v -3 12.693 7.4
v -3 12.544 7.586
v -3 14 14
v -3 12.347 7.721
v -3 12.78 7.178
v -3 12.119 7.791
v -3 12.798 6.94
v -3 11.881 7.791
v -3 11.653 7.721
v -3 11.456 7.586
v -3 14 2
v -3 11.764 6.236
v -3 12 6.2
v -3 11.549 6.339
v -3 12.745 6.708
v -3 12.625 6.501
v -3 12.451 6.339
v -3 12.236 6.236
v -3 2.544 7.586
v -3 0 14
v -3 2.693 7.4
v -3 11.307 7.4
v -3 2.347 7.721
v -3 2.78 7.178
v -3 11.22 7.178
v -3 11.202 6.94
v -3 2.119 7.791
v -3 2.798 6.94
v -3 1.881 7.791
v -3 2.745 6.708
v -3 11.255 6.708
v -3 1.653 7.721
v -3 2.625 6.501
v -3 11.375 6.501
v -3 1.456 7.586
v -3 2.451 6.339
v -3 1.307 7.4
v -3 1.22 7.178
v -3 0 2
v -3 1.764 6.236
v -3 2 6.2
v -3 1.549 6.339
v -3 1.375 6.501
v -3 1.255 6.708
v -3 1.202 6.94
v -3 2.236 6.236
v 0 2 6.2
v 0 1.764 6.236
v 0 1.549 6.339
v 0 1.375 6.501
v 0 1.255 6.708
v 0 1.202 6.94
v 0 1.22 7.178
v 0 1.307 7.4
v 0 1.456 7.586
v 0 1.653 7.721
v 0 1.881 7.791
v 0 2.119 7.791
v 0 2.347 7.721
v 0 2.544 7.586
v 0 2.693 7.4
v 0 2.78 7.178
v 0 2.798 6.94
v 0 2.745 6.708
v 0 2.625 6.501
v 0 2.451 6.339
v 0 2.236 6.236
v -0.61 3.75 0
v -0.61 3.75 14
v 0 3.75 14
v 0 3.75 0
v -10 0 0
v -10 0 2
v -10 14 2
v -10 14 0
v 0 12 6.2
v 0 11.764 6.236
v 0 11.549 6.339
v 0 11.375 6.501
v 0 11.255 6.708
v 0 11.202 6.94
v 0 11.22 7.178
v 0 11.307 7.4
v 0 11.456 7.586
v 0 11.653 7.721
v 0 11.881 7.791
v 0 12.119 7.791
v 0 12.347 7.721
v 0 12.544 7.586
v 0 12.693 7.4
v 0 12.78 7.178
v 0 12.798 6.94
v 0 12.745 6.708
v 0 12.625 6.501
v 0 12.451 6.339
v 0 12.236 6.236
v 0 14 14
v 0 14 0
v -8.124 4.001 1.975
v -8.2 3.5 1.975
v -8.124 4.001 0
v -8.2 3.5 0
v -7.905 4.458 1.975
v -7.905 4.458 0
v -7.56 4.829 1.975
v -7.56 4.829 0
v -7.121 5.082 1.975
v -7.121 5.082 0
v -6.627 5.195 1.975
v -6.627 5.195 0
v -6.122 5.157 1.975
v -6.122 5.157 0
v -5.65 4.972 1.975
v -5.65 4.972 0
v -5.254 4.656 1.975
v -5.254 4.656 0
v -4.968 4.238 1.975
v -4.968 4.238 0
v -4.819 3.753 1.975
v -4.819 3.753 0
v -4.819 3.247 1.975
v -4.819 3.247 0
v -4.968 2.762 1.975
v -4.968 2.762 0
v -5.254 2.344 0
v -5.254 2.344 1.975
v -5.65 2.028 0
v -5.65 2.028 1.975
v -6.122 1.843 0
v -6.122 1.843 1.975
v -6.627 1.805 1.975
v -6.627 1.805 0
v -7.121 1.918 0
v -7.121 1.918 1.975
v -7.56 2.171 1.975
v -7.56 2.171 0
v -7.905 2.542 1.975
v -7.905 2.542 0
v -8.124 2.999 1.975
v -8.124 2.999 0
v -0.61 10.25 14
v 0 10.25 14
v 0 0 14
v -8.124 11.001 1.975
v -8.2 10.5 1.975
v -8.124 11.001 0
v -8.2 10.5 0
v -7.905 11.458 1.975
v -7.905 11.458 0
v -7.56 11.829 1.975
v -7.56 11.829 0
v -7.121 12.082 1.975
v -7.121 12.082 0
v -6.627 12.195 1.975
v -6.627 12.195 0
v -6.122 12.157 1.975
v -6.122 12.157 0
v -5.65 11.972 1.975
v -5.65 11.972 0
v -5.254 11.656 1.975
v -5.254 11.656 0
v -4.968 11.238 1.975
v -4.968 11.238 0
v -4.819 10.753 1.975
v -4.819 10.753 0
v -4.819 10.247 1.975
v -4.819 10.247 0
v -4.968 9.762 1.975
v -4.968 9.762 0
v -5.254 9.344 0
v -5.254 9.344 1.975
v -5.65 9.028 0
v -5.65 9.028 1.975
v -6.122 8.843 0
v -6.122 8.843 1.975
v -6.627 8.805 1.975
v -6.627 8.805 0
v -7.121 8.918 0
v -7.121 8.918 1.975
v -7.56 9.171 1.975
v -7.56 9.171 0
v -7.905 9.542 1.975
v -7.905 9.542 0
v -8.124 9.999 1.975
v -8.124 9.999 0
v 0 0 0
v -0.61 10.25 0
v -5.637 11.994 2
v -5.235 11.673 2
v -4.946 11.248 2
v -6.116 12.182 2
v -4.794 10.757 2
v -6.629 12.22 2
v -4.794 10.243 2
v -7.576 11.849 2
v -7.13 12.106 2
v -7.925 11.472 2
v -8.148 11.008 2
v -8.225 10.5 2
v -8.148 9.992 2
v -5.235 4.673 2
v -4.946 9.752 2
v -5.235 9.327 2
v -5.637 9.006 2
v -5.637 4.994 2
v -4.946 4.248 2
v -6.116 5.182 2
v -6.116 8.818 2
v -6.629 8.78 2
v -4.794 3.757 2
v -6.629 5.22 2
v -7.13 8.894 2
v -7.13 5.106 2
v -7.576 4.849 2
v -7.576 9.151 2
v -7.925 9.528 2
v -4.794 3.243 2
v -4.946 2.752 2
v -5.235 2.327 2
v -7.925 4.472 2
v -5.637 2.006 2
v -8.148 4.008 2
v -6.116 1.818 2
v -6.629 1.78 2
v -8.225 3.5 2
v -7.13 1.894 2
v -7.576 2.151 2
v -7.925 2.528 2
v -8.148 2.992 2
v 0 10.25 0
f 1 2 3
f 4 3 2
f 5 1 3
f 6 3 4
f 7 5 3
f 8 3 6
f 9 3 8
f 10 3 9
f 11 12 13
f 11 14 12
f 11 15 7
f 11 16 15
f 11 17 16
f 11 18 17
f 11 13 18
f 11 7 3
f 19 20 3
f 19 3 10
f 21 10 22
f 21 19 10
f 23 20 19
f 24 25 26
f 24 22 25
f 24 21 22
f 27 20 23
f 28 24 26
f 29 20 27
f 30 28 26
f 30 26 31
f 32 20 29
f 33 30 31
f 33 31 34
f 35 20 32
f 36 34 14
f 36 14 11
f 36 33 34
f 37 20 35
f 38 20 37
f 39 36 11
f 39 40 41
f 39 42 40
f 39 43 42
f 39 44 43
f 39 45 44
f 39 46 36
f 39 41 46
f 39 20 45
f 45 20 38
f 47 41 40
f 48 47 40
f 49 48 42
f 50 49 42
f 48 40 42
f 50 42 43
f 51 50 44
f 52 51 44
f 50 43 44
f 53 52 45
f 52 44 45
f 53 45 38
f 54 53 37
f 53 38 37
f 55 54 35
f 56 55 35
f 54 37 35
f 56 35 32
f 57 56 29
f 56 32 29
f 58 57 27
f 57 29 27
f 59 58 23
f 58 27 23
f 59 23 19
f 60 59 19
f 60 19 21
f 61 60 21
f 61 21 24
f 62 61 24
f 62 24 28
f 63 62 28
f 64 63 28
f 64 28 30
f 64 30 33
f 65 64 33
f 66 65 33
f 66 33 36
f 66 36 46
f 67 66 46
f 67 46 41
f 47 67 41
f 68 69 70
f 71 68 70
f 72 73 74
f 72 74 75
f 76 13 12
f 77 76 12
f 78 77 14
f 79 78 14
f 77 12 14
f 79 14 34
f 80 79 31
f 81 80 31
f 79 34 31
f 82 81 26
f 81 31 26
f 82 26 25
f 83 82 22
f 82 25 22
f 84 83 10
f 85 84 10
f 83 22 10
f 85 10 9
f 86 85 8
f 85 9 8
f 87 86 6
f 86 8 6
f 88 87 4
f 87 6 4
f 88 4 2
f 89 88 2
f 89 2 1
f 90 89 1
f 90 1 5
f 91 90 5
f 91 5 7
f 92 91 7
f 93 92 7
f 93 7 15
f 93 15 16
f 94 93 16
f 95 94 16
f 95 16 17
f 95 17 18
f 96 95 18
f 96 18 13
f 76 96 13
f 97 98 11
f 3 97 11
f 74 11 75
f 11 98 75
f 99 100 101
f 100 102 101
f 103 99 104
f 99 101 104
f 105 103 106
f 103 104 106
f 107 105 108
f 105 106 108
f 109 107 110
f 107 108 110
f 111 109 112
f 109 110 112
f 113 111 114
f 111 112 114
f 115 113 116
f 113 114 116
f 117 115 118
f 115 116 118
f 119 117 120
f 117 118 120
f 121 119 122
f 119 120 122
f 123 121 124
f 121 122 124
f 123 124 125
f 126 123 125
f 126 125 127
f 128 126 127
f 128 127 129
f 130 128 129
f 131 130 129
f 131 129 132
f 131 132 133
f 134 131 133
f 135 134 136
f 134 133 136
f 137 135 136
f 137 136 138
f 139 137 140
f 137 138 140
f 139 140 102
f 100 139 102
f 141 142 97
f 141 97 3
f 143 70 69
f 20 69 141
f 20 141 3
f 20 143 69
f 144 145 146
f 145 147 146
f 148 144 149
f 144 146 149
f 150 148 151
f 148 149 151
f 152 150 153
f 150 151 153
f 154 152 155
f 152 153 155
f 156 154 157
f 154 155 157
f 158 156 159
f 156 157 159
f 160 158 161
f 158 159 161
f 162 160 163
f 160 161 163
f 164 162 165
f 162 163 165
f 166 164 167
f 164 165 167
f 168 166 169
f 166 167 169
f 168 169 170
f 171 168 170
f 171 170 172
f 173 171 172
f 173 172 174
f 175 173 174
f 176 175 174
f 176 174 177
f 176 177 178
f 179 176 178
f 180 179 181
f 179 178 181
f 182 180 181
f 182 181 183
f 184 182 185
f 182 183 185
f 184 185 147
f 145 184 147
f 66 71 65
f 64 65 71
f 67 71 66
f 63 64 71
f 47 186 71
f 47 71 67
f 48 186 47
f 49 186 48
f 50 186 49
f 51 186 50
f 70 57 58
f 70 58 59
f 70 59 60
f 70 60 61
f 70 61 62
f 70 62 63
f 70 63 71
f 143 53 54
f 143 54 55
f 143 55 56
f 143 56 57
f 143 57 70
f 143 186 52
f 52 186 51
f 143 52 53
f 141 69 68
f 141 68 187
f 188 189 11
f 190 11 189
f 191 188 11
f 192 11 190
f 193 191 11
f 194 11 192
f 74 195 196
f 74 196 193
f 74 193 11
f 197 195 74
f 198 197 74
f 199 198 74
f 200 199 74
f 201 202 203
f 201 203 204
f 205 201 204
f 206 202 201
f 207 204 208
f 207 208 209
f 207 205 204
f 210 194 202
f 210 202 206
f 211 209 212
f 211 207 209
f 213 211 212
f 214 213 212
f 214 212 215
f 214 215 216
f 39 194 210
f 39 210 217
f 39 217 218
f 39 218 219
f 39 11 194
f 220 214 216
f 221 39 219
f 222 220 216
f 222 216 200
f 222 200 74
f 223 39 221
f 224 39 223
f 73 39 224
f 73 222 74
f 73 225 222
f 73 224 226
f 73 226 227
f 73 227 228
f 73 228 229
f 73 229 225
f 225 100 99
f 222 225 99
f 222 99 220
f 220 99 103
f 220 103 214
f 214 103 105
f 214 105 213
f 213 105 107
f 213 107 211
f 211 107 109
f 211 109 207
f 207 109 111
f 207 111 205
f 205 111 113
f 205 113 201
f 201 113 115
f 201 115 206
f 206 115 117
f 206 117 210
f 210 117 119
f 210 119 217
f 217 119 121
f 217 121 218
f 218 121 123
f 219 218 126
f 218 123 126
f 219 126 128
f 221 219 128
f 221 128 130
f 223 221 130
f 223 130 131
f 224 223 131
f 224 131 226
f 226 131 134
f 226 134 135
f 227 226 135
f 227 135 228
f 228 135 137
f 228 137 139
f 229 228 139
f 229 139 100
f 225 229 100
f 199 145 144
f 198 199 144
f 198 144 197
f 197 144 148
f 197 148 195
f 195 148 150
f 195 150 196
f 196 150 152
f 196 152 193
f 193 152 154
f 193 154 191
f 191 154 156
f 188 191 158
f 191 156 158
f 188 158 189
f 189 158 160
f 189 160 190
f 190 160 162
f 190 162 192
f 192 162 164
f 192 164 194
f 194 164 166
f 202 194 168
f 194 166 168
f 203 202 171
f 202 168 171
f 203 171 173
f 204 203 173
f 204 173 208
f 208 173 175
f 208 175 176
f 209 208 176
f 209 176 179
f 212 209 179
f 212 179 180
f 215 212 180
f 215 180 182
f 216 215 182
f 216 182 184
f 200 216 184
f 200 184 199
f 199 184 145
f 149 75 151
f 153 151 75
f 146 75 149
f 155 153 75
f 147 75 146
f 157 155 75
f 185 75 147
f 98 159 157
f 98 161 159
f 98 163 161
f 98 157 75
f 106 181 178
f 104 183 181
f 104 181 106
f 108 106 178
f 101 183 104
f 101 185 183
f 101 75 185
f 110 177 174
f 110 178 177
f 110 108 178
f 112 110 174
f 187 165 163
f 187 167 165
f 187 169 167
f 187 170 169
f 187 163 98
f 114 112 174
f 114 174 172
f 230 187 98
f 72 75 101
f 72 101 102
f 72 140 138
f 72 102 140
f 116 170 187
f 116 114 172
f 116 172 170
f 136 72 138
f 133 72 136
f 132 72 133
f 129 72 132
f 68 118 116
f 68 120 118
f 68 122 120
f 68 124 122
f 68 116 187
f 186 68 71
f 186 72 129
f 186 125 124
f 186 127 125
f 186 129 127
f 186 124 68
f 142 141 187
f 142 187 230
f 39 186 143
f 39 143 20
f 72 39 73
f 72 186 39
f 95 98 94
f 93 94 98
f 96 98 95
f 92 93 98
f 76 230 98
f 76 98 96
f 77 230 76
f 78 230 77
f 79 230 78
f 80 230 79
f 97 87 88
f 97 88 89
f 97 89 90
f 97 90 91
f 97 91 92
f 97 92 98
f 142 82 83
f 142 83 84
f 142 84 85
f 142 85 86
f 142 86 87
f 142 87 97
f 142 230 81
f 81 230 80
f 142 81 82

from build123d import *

# Parameters (mm, degrees)
BOSS_EXTRUDE1_DEPTH            = 14
M3_CLEARANCE_HOLE1_D           = 3.4
M3_CLEARANCE_HOLE1_CSINK_D     = 3.45
M3_CLEARANCE_HOLE1_CSINK_ANGLE = 90
SKETCH2_W                      = 0.61
SKETCH2_H                      = 6.5
CUT_EXTRUDE1_DEPTH             = 23.181073013
M2_TAPPED_HOLE1_D              = 1.6


with BuildPart() as part:
    # Sketch1 → Boss-Extrude1 (new body)
    with BuildSketch(Plane(origin=(0, 0, 0), x_dir=(1, 0, 0), z_dir=(0, 1, 0))):
        Polygon((-10, 0), (0, 0), (0, -14), (-3, -14), (-3, -2), (-10, -2), align=None)
    extrude(amount=BOSS_EXTRUDE1_DEPTH)

    # M3 Clearance Hole1 (through all)
    with Locations(Plane.XY.offset(2)):
        with Locations((-6.5, 10.5), (-6.5, 3.5)):
            CounterSinkHole(M3_CLEARANCE_HOLE1_D / 2, M3_CLEARANCE_HOLE1_CSINK_D / 2, counter_sink_angle=M3_CLEARANCE_HOLE1_CSINK_ANGLE)

    # Sketch2 → Cut-Extrude1 (cut, through all)
    with BuildSketch(Plane.XY.offset(14)):
        with Locations((-0.305, 7)):
            Rectangle(SKETCH2_W, SKETCH2_H)
    extrude(amount=-CUT_EXTRUDE1_DEPTH, mode=Mode.SUBTRACT)

    # M2 Tapped Hole1 (through all)
    with Locations(Plane(origin=(0, 5.858814373, -1.158558045), x_dir=(0, 0, 1), z_dir=(1, 0, 0))):
        with Locations((8.158558045, -6.141185627), (8.158558045, 3.858814373)):
            Hole(M2_TAPPED_HOLE1_D / 2)


solid = part.part
